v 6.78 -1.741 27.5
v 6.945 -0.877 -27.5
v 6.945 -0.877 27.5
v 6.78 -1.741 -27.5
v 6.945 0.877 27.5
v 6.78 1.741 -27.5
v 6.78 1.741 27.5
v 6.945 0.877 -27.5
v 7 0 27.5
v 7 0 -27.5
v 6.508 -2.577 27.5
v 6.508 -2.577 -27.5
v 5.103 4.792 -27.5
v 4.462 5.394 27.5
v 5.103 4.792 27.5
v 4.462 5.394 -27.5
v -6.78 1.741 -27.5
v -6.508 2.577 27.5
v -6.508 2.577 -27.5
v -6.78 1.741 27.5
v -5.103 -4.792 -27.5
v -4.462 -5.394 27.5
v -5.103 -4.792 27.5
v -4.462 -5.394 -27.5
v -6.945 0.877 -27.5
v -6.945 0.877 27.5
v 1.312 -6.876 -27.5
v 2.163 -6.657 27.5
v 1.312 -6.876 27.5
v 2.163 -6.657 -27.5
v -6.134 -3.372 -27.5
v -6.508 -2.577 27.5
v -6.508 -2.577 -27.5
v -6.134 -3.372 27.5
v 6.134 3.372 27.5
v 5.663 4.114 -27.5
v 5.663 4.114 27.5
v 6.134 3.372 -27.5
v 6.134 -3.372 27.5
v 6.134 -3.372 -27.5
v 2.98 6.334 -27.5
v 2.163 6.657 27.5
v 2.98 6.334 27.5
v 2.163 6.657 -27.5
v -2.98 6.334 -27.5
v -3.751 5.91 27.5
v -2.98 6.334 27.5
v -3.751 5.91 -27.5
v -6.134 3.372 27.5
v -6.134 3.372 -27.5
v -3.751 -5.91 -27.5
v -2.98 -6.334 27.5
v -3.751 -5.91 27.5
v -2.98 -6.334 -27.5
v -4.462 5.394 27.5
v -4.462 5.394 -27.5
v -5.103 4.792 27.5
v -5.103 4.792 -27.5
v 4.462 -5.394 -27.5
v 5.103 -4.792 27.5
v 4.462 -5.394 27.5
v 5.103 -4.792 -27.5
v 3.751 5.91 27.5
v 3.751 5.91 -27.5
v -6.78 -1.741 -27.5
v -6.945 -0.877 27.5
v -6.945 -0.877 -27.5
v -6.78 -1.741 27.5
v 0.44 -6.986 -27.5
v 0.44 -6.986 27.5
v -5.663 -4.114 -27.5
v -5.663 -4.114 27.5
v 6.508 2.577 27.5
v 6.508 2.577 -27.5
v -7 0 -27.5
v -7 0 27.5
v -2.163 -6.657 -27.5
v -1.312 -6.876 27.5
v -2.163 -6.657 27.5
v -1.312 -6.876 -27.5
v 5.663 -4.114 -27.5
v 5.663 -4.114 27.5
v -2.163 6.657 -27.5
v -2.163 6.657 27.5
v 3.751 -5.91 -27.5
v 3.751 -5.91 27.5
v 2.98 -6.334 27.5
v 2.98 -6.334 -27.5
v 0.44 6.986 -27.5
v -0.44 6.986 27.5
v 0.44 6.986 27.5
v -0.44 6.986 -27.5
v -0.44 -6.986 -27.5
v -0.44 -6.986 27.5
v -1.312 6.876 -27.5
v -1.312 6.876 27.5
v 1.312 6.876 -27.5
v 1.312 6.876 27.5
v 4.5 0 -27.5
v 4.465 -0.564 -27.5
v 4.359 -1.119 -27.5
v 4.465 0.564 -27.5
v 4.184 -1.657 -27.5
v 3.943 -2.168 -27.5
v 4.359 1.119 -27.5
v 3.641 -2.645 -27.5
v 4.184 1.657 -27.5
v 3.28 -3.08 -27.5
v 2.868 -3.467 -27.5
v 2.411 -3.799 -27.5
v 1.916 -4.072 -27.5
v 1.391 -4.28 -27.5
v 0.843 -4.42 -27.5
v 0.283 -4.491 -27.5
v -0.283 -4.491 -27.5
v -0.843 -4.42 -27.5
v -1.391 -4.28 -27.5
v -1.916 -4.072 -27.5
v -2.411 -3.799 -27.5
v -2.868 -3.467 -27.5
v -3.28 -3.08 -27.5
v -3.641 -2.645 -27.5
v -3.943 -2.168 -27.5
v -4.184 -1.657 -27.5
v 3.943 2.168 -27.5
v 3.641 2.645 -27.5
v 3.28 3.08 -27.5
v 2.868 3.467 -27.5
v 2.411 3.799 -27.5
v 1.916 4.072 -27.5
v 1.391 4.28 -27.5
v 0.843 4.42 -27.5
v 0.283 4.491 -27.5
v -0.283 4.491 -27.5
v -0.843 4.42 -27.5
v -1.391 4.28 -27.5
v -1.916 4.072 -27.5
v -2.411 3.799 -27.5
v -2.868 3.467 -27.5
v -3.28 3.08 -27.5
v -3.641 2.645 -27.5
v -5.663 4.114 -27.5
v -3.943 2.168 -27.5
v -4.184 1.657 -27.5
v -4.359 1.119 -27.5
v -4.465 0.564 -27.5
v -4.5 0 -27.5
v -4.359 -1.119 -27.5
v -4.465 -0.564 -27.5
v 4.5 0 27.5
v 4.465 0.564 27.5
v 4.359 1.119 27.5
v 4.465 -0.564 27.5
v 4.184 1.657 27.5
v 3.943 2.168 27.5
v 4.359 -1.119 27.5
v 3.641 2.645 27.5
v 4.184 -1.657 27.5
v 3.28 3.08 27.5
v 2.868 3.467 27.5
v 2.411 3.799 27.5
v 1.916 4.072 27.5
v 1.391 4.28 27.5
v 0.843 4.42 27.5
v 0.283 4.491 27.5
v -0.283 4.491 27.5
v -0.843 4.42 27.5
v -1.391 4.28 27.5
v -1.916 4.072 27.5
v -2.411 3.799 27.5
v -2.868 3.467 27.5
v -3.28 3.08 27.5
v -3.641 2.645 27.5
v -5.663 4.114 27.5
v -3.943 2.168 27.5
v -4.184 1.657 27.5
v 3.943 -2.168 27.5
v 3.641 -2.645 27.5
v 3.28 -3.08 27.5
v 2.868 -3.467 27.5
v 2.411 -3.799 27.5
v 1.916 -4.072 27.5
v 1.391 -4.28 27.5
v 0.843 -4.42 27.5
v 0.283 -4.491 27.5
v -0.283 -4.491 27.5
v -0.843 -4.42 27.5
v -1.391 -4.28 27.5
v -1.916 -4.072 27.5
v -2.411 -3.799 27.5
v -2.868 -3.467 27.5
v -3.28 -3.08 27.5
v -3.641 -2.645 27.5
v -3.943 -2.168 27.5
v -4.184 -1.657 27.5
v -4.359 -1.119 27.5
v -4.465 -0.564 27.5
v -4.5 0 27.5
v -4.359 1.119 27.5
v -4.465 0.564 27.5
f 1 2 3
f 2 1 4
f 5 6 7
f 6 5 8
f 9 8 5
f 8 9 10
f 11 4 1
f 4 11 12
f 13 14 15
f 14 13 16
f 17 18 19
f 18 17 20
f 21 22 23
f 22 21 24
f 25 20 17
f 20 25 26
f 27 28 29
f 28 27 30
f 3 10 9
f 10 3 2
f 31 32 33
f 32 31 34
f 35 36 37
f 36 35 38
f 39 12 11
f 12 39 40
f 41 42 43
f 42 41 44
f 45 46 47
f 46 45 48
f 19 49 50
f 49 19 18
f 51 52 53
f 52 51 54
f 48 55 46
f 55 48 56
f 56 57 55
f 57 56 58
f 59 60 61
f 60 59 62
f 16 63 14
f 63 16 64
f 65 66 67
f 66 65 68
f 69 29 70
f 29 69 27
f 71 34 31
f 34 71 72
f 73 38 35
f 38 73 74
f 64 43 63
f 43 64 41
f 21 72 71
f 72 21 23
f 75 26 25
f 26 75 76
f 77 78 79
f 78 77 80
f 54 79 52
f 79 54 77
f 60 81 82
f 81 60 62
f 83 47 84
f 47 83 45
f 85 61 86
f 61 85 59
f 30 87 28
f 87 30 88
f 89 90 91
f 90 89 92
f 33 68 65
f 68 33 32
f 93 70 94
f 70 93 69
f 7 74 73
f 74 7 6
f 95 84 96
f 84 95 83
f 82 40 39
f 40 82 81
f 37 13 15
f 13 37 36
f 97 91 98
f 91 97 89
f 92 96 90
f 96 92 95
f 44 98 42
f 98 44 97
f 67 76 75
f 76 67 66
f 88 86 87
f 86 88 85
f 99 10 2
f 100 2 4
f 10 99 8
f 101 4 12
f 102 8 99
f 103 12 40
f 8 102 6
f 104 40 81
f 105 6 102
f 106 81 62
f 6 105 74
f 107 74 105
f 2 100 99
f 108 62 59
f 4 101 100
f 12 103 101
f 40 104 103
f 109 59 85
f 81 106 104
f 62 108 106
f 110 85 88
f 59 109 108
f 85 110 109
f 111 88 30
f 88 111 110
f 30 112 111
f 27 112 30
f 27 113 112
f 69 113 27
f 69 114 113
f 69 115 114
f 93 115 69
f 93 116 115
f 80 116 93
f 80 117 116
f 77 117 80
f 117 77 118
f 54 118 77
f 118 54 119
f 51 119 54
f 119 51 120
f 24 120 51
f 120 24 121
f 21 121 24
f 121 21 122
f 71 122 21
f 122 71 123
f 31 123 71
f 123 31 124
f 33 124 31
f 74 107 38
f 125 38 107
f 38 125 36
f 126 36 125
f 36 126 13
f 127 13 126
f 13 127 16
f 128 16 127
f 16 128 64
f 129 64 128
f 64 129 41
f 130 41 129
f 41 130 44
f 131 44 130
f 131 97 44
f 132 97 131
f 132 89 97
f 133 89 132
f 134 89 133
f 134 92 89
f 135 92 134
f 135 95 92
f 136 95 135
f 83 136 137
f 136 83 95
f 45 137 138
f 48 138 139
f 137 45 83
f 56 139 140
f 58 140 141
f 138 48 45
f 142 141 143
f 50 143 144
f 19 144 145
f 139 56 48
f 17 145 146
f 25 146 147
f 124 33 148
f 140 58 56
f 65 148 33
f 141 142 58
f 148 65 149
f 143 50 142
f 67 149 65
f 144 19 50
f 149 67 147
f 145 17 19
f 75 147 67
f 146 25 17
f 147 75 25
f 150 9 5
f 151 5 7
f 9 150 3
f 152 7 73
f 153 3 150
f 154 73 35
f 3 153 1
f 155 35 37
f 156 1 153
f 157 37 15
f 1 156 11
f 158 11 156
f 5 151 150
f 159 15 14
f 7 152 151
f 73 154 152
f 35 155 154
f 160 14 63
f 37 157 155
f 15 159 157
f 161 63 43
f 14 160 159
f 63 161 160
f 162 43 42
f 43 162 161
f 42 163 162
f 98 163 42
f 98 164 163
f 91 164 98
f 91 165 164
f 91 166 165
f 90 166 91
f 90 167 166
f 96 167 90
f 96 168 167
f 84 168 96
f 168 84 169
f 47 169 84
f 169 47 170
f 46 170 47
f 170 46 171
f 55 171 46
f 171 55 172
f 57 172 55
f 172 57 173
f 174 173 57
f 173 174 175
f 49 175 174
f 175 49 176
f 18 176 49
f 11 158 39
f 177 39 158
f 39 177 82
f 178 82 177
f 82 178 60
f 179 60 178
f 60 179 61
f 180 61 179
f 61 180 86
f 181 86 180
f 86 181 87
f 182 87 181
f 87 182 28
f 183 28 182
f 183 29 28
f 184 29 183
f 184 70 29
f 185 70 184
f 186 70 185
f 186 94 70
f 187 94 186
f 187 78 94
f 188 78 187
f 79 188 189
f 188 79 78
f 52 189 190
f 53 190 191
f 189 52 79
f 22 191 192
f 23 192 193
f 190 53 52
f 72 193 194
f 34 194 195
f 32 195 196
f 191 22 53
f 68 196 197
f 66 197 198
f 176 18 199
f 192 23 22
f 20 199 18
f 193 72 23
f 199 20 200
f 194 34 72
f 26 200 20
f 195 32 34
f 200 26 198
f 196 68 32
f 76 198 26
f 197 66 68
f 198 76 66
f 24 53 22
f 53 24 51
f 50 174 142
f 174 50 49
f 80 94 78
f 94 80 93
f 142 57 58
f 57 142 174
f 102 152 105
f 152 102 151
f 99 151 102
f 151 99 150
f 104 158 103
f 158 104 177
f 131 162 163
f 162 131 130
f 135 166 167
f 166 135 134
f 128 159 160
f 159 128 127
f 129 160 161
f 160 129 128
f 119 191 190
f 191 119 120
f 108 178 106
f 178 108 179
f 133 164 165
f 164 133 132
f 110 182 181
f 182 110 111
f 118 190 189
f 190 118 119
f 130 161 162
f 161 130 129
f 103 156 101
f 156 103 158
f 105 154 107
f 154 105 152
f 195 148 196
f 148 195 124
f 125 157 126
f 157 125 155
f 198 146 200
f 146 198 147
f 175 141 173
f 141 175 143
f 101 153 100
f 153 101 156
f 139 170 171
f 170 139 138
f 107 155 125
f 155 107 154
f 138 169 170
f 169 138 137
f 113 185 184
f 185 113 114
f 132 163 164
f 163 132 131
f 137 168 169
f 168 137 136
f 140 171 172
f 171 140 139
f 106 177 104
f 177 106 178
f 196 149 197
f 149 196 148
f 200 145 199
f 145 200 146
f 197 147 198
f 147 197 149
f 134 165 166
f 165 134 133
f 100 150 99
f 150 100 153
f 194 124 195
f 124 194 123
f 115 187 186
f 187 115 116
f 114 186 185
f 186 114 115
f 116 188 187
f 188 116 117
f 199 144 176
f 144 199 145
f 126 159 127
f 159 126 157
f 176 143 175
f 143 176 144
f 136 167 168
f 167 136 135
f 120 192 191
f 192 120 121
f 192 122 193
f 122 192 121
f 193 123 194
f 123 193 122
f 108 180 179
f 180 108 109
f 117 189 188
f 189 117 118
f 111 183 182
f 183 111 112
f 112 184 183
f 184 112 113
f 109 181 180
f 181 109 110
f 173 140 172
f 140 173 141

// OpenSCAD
$fn = 50;


difference() {
	union() {
		translate(v = [0, 0, -27.5000000000]) {
			cylinder(h = 55, r = 7.0000000000);
		}
	}
	union() {
		translate(v = [0, 0, -100.0000000000]) {
			cylinder(h = 200, r = 4.5000000000);
		}
	}
}
